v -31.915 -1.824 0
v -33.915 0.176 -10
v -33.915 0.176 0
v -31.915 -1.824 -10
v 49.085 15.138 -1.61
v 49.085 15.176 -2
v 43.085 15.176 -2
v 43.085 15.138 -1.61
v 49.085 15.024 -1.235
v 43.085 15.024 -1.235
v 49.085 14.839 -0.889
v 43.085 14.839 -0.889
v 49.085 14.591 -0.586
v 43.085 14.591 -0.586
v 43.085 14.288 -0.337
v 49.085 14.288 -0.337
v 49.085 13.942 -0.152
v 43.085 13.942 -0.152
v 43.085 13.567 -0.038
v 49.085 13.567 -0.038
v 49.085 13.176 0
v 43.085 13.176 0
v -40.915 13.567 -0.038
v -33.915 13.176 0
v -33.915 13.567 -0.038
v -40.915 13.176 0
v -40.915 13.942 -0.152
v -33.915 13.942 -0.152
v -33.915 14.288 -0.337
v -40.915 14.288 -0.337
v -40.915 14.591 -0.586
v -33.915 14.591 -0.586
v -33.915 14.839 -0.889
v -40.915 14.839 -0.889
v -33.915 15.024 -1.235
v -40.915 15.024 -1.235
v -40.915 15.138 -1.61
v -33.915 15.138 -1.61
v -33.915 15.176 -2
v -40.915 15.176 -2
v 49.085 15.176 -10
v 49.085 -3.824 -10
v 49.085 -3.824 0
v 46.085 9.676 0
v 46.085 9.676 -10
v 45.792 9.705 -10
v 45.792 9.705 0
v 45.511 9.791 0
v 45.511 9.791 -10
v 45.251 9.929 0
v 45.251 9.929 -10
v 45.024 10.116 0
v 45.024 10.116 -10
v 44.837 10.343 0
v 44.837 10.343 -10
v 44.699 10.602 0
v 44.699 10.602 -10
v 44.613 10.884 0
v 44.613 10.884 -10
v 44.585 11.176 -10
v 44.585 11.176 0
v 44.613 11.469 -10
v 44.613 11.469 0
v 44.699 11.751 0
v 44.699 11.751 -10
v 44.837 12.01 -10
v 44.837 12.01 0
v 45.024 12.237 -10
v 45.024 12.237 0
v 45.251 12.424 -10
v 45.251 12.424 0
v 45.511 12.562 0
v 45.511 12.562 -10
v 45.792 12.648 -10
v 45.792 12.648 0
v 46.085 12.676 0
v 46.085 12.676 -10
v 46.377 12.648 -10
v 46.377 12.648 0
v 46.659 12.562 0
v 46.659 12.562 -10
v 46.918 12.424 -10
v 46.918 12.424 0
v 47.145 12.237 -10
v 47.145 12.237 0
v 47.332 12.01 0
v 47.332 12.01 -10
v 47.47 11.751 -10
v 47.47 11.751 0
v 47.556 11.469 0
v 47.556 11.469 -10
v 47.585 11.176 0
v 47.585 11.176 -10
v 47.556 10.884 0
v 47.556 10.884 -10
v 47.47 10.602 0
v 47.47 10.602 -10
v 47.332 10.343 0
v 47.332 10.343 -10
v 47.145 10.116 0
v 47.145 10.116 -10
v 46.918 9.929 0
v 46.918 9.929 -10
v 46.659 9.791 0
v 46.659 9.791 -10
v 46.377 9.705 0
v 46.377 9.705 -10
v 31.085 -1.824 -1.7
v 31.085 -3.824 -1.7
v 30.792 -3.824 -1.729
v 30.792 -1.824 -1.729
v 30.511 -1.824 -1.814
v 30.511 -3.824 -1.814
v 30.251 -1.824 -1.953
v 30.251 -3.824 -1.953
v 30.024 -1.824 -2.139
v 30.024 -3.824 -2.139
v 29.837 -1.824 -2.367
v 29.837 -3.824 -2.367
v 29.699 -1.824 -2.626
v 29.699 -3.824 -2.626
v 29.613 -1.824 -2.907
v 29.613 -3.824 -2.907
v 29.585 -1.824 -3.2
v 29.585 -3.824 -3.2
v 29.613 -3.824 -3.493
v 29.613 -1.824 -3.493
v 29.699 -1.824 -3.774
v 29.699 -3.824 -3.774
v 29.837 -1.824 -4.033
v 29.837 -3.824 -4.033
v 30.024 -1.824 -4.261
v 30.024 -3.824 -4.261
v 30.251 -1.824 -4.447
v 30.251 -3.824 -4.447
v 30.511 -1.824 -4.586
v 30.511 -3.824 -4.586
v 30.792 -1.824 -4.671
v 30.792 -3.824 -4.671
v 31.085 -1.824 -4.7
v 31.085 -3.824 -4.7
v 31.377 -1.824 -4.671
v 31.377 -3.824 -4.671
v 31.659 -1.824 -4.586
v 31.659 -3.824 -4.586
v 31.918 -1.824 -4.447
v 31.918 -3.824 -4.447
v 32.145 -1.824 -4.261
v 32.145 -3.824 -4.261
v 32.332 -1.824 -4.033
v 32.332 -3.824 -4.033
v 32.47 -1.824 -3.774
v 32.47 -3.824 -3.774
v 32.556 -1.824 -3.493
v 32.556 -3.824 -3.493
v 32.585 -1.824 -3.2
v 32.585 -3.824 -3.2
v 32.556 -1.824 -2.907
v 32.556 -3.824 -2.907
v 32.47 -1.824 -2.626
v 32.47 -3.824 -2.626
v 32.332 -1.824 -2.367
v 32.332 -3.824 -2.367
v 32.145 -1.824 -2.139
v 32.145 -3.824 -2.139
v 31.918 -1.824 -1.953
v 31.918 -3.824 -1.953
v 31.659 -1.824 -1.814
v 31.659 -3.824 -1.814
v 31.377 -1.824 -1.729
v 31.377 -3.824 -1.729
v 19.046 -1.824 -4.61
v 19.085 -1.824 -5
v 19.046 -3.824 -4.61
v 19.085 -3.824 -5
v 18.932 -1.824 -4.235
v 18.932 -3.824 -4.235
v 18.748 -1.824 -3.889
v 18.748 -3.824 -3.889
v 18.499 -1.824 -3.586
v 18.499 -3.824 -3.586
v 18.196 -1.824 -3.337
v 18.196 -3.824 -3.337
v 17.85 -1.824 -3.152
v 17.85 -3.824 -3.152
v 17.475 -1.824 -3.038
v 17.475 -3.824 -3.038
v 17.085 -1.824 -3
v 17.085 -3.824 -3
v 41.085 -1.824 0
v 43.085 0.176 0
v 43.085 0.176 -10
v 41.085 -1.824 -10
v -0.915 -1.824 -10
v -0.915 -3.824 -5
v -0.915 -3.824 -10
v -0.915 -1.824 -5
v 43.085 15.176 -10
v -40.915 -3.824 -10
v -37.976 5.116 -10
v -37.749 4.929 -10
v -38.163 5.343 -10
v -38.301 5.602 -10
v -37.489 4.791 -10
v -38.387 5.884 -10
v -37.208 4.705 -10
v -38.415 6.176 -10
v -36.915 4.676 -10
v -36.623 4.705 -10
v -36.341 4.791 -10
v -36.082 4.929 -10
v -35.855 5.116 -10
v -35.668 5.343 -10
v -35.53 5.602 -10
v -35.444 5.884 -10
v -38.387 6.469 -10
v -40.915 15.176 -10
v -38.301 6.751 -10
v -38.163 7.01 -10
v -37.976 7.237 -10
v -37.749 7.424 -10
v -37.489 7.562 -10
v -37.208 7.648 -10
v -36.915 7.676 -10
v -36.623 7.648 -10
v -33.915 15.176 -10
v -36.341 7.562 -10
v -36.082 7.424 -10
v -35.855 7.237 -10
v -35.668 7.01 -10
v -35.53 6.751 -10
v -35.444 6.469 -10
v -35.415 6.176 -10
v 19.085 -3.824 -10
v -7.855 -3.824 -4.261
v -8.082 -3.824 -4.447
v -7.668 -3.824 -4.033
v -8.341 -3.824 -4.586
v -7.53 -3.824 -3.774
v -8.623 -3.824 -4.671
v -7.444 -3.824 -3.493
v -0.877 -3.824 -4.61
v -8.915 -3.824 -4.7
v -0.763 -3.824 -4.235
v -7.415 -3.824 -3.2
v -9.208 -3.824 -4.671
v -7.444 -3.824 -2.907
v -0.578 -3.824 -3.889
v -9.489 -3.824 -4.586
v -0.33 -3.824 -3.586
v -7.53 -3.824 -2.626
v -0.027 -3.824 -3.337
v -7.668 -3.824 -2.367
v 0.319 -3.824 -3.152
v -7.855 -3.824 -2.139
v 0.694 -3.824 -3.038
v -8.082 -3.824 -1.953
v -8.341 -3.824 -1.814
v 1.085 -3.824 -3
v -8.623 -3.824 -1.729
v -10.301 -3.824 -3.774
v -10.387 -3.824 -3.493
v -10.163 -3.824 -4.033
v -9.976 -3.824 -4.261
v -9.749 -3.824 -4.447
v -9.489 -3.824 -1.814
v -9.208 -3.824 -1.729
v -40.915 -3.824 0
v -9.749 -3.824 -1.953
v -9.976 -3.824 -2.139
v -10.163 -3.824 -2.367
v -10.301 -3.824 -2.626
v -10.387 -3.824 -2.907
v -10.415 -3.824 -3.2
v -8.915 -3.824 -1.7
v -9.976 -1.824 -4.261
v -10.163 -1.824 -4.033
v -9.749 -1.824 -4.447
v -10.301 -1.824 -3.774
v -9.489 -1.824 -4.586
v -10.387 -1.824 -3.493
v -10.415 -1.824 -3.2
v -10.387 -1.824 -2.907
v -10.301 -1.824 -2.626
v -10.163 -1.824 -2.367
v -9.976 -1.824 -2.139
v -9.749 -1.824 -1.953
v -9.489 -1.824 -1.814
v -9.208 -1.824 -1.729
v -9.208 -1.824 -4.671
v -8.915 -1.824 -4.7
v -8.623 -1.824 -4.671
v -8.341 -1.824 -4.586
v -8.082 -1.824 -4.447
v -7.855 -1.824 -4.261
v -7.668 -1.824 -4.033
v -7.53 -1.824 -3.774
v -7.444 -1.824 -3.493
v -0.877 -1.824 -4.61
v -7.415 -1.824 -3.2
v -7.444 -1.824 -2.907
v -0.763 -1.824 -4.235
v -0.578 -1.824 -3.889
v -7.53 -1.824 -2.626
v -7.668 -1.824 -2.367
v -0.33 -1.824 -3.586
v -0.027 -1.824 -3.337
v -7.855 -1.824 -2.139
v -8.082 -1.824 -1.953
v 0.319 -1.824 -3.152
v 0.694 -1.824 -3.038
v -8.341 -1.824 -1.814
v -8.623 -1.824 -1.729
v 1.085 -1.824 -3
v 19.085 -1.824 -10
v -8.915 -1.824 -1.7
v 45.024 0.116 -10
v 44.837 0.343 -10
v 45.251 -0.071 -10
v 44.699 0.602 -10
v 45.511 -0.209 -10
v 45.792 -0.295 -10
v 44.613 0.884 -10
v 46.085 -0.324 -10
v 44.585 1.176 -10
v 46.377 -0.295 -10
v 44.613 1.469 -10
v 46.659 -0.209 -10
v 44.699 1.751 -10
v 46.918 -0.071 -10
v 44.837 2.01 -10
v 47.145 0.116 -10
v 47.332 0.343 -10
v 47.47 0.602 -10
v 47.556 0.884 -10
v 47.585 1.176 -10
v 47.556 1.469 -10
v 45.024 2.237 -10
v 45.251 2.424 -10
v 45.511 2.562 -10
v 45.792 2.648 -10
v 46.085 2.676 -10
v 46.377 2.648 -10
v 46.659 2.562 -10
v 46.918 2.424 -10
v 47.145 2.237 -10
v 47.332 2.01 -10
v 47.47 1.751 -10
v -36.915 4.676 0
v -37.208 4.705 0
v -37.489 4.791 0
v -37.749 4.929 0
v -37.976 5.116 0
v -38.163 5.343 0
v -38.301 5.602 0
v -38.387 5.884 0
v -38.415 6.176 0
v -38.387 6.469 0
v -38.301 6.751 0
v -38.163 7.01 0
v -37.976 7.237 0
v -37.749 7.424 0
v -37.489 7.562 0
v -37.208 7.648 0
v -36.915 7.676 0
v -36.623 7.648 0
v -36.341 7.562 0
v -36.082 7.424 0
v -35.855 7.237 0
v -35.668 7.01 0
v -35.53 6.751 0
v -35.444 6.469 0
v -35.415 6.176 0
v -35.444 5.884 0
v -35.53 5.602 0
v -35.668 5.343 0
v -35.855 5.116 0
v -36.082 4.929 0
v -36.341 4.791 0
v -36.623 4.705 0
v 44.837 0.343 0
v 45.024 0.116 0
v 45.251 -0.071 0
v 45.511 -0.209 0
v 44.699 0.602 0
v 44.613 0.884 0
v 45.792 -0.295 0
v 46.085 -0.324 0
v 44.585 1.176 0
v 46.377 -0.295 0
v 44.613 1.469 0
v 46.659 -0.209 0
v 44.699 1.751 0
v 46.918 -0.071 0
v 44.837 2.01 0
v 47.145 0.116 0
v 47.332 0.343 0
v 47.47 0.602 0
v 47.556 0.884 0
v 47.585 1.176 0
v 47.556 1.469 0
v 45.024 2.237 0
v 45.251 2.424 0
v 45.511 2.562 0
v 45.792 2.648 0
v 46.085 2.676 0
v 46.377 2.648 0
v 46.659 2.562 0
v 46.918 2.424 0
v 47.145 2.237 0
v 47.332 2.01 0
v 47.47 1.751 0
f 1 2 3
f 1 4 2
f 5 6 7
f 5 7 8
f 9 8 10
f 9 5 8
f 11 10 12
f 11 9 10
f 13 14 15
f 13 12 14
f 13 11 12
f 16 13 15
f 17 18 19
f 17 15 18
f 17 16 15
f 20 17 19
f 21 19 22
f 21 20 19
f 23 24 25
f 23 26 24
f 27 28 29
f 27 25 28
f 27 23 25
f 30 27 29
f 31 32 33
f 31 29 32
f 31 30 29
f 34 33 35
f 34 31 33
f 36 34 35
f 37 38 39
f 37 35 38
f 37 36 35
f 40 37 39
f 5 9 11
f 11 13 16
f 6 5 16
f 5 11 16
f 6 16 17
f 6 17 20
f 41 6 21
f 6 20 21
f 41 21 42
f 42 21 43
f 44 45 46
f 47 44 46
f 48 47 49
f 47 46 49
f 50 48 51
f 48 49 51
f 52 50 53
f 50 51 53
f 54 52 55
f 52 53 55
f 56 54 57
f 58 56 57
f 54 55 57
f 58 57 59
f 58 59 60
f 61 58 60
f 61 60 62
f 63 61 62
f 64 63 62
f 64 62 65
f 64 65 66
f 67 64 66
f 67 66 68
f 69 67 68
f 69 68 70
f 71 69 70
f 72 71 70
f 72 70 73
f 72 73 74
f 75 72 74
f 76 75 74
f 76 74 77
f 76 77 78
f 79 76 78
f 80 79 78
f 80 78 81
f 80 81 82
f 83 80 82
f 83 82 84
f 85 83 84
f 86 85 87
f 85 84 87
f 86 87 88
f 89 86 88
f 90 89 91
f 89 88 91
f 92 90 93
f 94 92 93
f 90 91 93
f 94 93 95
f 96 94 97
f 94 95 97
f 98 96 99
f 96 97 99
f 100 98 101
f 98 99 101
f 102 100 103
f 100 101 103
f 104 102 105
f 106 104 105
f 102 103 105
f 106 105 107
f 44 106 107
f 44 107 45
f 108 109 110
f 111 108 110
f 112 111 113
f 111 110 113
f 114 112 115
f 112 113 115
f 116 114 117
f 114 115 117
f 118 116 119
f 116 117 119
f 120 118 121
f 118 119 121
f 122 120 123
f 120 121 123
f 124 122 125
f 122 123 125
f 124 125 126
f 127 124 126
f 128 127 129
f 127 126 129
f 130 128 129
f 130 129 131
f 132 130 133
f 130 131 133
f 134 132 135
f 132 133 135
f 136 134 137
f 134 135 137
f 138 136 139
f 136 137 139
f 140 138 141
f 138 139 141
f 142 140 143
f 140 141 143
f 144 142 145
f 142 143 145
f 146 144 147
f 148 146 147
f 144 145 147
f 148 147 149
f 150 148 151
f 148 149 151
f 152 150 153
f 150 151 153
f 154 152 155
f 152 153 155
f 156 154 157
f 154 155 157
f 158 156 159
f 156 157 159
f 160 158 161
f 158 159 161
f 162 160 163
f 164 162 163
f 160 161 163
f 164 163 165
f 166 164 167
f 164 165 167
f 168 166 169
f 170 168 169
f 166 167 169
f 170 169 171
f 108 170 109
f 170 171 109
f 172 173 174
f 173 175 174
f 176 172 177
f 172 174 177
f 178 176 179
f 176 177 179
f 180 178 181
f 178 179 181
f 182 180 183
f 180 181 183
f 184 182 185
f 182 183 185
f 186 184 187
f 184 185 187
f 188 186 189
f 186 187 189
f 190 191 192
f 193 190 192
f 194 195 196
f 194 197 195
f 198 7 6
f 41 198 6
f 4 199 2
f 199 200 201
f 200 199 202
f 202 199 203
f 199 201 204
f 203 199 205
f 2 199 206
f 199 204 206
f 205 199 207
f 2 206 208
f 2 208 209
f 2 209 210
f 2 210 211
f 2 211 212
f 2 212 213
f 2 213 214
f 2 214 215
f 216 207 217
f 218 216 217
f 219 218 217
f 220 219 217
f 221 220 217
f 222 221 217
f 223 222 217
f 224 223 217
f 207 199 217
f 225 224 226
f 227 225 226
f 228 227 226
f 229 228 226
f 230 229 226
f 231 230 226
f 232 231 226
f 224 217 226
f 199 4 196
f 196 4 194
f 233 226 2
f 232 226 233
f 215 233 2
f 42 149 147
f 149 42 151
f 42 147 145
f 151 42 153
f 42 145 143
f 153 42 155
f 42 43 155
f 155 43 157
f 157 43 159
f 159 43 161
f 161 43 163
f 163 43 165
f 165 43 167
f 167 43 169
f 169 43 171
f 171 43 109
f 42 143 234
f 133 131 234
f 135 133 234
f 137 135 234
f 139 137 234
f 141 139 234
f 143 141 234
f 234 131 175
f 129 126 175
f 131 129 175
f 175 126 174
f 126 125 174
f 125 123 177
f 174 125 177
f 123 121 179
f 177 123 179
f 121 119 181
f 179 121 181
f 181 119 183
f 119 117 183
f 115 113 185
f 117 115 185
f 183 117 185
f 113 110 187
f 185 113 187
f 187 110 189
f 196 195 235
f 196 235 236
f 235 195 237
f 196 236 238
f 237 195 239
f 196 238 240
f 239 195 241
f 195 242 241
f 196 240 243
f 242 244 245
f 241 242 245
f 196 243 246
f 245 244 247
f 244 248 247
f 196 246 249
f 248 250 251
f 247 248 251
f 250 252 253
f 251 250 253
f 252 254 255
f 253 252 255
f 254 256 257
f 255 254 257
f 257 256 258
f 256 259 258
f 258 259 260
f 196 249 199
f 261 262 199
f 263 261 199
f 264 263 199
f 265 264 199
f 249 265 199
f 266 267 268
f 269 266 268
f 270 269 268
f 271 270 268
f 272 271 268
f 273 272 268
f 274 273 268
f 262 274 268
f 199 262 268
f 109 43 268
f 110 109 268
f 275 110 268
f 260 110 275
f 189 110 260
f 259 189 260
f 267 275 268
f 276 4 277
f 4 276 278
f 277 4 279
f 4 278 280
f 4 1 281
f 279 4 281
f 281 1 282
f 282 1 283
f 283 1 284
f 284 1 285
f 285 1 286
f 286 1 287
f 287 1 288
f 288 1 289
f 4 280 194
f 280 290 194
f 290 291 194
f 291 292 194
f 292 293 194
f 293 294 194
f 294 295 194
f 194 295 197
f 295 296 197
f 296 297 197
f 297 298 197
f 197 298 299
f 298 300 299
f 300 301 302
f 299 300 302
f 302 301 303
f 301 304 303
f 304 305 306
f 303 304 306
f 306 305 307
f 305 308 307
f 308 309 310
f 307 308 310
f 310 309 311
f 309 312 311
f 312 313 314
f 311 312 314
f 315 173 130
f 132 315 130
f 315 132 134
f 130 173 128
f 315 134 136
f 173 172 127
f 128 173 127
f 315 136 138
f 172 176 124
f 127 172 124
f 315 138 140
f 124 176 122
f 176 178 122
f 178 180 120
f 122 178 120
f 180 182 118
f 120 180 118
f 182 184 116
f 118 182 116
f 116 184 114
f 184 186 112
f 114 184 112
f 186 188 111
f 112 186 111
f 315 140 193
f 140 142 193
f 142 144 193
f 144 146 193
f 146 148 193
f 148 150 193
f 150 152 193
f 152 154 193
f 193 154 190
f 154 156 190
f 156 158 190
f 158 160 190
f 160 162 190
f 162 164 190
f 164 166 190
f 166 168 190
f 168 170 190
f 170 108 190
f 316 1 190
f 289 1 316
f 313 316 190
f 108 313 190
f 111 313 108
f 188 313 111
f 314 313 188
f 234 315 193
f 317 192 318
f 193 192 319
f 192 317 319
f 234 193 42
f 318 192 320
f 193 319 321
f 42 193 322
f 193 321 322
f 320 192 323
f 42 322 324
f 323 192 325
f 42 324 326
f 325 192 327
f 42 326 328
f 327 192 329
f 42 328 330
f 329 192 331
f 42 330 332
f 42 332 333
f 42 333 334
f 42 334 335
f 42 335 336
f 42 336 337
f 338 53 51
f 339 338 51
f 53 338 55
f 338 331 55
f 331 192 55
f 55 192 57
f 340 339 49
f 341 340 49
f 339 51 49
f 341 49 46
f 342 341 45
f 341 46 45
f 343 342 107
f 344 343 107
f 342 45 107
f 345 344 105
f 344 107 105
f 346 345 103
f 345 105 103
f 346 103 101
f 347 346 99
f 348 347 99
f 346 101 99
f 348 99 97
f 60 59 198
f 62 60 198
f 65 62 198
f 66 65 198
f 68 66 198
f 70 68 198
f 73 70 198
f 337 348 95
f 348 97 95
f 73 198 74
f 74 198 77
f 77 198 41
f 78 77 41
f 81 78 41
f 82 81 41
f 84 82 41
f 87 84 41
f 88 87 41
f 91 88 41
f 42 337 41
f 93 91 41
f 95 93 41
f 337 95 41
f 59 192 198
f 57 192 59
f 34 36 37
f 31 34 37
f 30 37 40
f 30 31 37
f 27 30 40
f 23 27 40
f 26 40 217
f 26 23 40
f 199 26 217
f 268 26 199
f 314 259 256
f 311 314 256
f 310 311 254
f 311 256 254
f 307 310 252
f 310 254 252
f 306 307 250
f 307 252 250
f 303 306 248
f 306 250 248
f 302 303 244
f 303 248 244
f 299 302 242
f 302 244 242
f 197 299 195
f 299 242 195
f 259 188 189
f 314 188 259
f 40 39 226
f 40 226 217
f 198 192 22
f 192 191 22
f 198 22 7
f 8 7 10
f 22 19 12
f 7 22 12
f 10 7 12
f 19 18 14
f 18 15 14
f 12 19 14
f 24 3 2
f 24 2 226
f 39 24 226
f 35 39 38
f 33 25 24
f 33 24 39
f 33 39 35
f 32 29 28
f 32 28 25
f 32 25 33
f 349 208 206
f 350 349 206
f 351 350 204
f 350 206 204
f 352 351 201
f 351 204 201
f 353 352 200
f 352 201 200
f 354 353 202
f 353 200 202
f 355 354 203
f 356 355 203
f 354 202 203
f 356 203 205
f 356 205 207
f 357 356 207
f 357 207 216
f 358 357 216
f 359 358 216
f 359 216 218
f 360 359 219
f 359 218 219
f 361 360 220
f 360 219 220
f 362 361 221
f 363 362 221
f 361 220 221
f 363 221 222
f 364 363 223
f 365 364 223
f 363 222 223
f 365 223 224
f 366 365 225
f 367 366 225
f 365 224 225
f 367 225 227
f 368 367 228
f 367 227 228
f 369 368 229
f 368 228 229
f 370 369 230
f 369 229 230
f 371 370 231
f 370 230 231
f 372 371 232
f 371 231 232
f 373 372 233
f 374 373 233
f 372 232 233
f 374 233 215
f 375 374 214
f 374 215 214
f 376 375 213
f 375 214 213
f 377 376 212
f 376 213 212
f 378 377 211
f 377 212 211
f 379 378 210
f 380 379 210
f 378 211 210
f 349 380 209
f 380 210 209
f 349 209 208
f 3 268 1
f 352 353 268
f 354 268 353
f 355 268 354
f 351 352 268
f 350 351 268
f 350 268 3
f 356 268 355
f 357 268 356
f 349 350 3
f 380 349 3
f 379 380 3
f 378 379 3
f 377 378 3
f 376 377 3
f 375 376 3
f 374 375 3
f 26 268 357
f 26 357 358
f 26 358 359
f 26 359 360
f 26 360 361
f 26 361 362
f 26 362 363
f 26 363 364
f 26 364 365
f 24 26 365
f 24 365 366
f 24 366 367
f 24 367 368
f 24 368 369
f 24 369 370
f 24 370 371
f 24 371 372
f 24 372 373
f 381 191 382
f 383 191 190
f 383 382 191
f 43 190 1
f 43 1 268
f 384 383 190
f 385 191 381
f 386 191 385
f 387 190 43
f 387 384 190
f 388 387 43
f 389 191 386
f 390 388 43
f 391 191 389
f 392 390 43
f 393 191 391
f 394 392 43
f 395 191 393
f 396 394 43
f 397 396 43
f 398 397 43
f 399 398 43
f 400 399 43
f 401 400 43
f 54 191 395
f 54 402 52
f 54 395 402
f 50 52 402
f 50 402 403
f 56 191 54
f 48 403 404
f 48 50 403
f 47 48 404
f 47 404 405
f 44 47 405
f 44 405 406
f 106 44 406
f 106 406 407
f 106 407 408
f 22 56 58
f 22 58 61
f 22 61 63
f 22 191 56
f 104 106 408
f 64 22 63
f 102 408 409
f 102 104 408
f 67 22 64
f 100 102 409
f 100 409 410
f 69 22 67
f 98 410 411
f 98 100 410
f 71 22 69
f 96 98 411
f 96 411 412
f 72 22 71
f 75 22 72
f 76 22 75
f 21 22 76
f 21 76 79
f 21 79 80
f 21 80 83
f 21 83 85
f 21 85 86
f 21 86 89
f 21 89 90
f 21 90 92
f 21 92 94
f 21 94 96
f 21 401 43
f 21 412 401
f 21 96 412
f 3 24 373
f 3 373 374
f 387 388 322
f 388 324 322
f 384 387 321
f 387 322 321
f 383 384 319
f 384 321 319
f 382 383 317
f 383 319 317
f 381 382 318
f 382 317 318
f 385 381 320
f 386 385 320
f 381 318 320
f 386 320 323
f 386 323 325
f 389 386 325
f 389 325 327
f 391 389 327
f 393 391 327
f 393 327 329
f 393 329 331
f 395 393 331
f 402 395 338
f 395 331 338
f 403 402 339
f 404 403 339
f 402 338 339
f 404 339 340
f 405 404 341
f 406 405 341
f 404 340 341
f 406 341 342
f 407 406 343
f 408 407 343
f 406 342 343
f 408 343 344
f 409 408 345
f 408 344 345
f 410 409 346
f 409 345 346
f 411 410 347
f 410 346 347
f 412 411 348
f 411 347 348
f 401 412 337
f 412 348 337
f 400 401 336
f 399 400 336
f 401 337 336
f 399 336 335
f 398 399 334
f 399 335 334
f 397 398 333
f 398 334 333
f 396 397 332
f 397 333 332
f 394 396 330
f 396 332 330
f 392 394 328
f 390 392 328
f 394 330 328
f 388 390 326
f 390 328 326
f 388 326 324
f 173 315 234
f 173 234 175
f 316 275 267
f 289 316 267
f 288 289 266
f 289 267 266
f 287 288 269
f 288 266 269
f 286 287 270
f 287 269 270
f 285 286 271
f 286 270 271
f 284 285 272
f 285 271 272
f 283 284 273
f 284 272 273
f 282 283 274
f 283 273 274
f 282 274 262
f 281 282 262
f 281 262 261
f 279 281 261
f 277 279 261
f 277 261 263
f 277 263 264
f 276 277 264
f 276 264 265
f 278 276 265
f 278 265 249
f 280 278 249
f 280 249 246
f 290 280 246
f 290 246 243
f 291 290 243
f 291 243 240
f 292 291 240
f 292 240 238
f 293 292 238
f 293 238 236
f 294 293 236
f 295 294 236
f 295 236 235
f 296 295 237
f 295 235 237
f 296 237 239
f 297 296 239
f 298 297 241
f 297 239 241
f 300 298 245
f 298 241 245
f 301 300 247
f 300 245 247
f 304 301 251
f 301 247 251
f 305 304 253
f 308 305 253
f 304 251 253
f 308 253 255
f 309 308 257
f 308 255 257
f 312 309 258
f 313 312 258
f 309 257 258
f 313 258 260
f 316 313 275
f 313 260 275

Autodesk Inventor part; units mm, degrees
ref_plane "YZ Plane" through (0, 0, 0) normal (1, 0, 0) x (0, 1, 0)
ref_plane "XZ Plane" through (0, 0, 0) normal (0, 1, 0) x (-1, 0, 0)
ref_plane "XY Plane" through (0, 0, 0) normal (0, 0, 1) x (1, 0, 0)
sketch "Sketch1" plane through (0, 0, 0) normal (0, 0, 1) x (1, 0, 0)
  line L0 (-40.9154, -1.8235) -> (49.0846, -1.8235)
  line L1 (49.0846, -1.8235) -> (49.0846, -3.8235)
  line L2 (49.0846, -3.8235) -> (-40.9154, -3.8235)
  line L3 (-40.9154, -3.8235) -> (-40.9154, -1.8235)
  line L4 (-40.9154, -1.8235) -> (-33.9154, -1.8235)
  line L5 (-33.9154, -1.8235) -> (-33.9154, 15.1765)
  line L6 (-33.9154, 15.1765) -> (-40.9154, 15.1765)
  line L7 (-40.9154, 15.1765) -> (-40.9154, -1.8235)
  line L8 (49.0846, -1.8235) -> (43.0846, -1.8235)
  line L9 (43.0846, -1.8235) -> (43.0846, 15.1765)
  line L10 (43.0846, 15.1765) -> (49.0846, 15.1765)
  line L11 (49.0846, 15.1765) -> (49.0846, -1.8235)
  circle A0 centre (-36.9154, 6.1765) radius 1.5
  circle A1 centre (46.0846, 11.1765) radius 1.5
  circle A2 centre (46.0846, 1.1765) radius 1.5
  point P0 (0, 0)
  point P1 (43.0846, -1.8235)
  point P2 (43.0846, -1.8235)
  dimension "d0" = 2
  dimension "d1" = 90
  dimension "d2" = 10
  dimension "d3" = 5
  dimension "d4" = 15
  dimension "d5" = 83
  dimension "d6" = 83
  dimension "d7" = 4
  dimension "d8" = 3
  dimension "d9" = 3
  dimension "d10" = 3
  dimension "d11" = 19
  dimension "d12" = 3
  dimension "d13" = 3
  dimension "d14" = 3
extrude "Extrusion1" add sketch "Sketch1" against normal blind 10 contours L7 L6 L5 L0 | L0 L1 L2 L3 | L9 L10 L11 L0 | A0 | A1 | A2
fillet "Fillet1" radius 2 2 edges at (-37.4154, 15.1765, 0) (46.0846, 15.1765, 0)
sketch "Sketch2" plane through (0, 0, 0) normal (0, 0, 1) x (1, 0, 0)
  line L0 (-40.9154, -3.8235) -> (49.0846, -3.8235) projected
  line L1 (-40.9154, 13.1765) -> (-40.9154, -3.8235) projected
  line L2 (49.0846, -3.8235) -> (49.0846, 13.1765) projected
  point P0 (0, 0)
  point P1 (-36.9154, 6.1765)
  point P2 (46.0846, 1.1765)
  point P3 (46.0846, 11.1765)
  dimension "d18" = 10
  dimension "d19" = 5
  dimension "d20" = 15
  dimension "d21" = 4
  dimension "d22" = 83
  dimension "d23" = 83
  dimension "d24" = 3
hole "Hole1" at (-36.9154, 6.1765, 0) at (46.0846, 1.1765, 0) at (46.0846, 11.1765, 0) direction (0, 0, -1) diameter 3 depth 10 tip angle 118
chamfer "Chamfer1" distance 2 angle 45 2 edges at (-33.9154, -1.8235, -5) (43.0846, -1.8235, -5)
sketch "Sketch3" plane through (-31.9154, -1.8235, 0) normal (0, 1, 0) x (1, 0, 0)
  line L0 (73, 0) -> (0, 0) projected
  line L1 (73, 10) -> (73, 0) projected
  point P0 (31.9154, 0)
  point P1 (23, 3.2)
  point P2 (63, 3.2)
  point P3 (68.374, 17.0038)
  dimension "d35" = 3.2
  dimension "d36" = 3.2
  dimension "d37" = 10
  dimension "d38" = 50
hole "Hole2" at (-8.9154, -1.8235, -3.2) at (31.0846, -1.8235, -3.2) at (36.4586, -1.8235, -17.0038) direction (0, -1, 0) diameter 3 depth 10 tip angle 118
sketch "Sketch4" plane through (-31.9154, -1.8235, 0) normal (0, 1, 0) x (1, 0, 0)
  line L0 (0, 10) -> (73, 10) projected
  line L1 (31, 10) -> (51, 10)
  line L2 (51, 10) -> (51, 3)
  line L3 (51, 3) -> (31, 3)
  line L4 (31, 3) -> (31, 10)
  circle A0 centre (23, 3.2) radius 1.5 projected
  circle A1 centre (63, 3.2) radius 1.5 projected
  line L5 (73, 0) -> (0, 0) projected
  point P0 (31.9154, 0)
  dimension "d46" = 8
  dimension "d47" = 12
  dimension "d48" = 3
extrude "Extrusion2" cut sketch "Sketch4" against normal blind 2 contours L0 L2 L3 L4
fillet "Fillet2" radius 2 2 edges at (-0.9154, -2.8235, -3) (19.0846, -2.8235, -3)
properties part number "atx-adapter_mount"
